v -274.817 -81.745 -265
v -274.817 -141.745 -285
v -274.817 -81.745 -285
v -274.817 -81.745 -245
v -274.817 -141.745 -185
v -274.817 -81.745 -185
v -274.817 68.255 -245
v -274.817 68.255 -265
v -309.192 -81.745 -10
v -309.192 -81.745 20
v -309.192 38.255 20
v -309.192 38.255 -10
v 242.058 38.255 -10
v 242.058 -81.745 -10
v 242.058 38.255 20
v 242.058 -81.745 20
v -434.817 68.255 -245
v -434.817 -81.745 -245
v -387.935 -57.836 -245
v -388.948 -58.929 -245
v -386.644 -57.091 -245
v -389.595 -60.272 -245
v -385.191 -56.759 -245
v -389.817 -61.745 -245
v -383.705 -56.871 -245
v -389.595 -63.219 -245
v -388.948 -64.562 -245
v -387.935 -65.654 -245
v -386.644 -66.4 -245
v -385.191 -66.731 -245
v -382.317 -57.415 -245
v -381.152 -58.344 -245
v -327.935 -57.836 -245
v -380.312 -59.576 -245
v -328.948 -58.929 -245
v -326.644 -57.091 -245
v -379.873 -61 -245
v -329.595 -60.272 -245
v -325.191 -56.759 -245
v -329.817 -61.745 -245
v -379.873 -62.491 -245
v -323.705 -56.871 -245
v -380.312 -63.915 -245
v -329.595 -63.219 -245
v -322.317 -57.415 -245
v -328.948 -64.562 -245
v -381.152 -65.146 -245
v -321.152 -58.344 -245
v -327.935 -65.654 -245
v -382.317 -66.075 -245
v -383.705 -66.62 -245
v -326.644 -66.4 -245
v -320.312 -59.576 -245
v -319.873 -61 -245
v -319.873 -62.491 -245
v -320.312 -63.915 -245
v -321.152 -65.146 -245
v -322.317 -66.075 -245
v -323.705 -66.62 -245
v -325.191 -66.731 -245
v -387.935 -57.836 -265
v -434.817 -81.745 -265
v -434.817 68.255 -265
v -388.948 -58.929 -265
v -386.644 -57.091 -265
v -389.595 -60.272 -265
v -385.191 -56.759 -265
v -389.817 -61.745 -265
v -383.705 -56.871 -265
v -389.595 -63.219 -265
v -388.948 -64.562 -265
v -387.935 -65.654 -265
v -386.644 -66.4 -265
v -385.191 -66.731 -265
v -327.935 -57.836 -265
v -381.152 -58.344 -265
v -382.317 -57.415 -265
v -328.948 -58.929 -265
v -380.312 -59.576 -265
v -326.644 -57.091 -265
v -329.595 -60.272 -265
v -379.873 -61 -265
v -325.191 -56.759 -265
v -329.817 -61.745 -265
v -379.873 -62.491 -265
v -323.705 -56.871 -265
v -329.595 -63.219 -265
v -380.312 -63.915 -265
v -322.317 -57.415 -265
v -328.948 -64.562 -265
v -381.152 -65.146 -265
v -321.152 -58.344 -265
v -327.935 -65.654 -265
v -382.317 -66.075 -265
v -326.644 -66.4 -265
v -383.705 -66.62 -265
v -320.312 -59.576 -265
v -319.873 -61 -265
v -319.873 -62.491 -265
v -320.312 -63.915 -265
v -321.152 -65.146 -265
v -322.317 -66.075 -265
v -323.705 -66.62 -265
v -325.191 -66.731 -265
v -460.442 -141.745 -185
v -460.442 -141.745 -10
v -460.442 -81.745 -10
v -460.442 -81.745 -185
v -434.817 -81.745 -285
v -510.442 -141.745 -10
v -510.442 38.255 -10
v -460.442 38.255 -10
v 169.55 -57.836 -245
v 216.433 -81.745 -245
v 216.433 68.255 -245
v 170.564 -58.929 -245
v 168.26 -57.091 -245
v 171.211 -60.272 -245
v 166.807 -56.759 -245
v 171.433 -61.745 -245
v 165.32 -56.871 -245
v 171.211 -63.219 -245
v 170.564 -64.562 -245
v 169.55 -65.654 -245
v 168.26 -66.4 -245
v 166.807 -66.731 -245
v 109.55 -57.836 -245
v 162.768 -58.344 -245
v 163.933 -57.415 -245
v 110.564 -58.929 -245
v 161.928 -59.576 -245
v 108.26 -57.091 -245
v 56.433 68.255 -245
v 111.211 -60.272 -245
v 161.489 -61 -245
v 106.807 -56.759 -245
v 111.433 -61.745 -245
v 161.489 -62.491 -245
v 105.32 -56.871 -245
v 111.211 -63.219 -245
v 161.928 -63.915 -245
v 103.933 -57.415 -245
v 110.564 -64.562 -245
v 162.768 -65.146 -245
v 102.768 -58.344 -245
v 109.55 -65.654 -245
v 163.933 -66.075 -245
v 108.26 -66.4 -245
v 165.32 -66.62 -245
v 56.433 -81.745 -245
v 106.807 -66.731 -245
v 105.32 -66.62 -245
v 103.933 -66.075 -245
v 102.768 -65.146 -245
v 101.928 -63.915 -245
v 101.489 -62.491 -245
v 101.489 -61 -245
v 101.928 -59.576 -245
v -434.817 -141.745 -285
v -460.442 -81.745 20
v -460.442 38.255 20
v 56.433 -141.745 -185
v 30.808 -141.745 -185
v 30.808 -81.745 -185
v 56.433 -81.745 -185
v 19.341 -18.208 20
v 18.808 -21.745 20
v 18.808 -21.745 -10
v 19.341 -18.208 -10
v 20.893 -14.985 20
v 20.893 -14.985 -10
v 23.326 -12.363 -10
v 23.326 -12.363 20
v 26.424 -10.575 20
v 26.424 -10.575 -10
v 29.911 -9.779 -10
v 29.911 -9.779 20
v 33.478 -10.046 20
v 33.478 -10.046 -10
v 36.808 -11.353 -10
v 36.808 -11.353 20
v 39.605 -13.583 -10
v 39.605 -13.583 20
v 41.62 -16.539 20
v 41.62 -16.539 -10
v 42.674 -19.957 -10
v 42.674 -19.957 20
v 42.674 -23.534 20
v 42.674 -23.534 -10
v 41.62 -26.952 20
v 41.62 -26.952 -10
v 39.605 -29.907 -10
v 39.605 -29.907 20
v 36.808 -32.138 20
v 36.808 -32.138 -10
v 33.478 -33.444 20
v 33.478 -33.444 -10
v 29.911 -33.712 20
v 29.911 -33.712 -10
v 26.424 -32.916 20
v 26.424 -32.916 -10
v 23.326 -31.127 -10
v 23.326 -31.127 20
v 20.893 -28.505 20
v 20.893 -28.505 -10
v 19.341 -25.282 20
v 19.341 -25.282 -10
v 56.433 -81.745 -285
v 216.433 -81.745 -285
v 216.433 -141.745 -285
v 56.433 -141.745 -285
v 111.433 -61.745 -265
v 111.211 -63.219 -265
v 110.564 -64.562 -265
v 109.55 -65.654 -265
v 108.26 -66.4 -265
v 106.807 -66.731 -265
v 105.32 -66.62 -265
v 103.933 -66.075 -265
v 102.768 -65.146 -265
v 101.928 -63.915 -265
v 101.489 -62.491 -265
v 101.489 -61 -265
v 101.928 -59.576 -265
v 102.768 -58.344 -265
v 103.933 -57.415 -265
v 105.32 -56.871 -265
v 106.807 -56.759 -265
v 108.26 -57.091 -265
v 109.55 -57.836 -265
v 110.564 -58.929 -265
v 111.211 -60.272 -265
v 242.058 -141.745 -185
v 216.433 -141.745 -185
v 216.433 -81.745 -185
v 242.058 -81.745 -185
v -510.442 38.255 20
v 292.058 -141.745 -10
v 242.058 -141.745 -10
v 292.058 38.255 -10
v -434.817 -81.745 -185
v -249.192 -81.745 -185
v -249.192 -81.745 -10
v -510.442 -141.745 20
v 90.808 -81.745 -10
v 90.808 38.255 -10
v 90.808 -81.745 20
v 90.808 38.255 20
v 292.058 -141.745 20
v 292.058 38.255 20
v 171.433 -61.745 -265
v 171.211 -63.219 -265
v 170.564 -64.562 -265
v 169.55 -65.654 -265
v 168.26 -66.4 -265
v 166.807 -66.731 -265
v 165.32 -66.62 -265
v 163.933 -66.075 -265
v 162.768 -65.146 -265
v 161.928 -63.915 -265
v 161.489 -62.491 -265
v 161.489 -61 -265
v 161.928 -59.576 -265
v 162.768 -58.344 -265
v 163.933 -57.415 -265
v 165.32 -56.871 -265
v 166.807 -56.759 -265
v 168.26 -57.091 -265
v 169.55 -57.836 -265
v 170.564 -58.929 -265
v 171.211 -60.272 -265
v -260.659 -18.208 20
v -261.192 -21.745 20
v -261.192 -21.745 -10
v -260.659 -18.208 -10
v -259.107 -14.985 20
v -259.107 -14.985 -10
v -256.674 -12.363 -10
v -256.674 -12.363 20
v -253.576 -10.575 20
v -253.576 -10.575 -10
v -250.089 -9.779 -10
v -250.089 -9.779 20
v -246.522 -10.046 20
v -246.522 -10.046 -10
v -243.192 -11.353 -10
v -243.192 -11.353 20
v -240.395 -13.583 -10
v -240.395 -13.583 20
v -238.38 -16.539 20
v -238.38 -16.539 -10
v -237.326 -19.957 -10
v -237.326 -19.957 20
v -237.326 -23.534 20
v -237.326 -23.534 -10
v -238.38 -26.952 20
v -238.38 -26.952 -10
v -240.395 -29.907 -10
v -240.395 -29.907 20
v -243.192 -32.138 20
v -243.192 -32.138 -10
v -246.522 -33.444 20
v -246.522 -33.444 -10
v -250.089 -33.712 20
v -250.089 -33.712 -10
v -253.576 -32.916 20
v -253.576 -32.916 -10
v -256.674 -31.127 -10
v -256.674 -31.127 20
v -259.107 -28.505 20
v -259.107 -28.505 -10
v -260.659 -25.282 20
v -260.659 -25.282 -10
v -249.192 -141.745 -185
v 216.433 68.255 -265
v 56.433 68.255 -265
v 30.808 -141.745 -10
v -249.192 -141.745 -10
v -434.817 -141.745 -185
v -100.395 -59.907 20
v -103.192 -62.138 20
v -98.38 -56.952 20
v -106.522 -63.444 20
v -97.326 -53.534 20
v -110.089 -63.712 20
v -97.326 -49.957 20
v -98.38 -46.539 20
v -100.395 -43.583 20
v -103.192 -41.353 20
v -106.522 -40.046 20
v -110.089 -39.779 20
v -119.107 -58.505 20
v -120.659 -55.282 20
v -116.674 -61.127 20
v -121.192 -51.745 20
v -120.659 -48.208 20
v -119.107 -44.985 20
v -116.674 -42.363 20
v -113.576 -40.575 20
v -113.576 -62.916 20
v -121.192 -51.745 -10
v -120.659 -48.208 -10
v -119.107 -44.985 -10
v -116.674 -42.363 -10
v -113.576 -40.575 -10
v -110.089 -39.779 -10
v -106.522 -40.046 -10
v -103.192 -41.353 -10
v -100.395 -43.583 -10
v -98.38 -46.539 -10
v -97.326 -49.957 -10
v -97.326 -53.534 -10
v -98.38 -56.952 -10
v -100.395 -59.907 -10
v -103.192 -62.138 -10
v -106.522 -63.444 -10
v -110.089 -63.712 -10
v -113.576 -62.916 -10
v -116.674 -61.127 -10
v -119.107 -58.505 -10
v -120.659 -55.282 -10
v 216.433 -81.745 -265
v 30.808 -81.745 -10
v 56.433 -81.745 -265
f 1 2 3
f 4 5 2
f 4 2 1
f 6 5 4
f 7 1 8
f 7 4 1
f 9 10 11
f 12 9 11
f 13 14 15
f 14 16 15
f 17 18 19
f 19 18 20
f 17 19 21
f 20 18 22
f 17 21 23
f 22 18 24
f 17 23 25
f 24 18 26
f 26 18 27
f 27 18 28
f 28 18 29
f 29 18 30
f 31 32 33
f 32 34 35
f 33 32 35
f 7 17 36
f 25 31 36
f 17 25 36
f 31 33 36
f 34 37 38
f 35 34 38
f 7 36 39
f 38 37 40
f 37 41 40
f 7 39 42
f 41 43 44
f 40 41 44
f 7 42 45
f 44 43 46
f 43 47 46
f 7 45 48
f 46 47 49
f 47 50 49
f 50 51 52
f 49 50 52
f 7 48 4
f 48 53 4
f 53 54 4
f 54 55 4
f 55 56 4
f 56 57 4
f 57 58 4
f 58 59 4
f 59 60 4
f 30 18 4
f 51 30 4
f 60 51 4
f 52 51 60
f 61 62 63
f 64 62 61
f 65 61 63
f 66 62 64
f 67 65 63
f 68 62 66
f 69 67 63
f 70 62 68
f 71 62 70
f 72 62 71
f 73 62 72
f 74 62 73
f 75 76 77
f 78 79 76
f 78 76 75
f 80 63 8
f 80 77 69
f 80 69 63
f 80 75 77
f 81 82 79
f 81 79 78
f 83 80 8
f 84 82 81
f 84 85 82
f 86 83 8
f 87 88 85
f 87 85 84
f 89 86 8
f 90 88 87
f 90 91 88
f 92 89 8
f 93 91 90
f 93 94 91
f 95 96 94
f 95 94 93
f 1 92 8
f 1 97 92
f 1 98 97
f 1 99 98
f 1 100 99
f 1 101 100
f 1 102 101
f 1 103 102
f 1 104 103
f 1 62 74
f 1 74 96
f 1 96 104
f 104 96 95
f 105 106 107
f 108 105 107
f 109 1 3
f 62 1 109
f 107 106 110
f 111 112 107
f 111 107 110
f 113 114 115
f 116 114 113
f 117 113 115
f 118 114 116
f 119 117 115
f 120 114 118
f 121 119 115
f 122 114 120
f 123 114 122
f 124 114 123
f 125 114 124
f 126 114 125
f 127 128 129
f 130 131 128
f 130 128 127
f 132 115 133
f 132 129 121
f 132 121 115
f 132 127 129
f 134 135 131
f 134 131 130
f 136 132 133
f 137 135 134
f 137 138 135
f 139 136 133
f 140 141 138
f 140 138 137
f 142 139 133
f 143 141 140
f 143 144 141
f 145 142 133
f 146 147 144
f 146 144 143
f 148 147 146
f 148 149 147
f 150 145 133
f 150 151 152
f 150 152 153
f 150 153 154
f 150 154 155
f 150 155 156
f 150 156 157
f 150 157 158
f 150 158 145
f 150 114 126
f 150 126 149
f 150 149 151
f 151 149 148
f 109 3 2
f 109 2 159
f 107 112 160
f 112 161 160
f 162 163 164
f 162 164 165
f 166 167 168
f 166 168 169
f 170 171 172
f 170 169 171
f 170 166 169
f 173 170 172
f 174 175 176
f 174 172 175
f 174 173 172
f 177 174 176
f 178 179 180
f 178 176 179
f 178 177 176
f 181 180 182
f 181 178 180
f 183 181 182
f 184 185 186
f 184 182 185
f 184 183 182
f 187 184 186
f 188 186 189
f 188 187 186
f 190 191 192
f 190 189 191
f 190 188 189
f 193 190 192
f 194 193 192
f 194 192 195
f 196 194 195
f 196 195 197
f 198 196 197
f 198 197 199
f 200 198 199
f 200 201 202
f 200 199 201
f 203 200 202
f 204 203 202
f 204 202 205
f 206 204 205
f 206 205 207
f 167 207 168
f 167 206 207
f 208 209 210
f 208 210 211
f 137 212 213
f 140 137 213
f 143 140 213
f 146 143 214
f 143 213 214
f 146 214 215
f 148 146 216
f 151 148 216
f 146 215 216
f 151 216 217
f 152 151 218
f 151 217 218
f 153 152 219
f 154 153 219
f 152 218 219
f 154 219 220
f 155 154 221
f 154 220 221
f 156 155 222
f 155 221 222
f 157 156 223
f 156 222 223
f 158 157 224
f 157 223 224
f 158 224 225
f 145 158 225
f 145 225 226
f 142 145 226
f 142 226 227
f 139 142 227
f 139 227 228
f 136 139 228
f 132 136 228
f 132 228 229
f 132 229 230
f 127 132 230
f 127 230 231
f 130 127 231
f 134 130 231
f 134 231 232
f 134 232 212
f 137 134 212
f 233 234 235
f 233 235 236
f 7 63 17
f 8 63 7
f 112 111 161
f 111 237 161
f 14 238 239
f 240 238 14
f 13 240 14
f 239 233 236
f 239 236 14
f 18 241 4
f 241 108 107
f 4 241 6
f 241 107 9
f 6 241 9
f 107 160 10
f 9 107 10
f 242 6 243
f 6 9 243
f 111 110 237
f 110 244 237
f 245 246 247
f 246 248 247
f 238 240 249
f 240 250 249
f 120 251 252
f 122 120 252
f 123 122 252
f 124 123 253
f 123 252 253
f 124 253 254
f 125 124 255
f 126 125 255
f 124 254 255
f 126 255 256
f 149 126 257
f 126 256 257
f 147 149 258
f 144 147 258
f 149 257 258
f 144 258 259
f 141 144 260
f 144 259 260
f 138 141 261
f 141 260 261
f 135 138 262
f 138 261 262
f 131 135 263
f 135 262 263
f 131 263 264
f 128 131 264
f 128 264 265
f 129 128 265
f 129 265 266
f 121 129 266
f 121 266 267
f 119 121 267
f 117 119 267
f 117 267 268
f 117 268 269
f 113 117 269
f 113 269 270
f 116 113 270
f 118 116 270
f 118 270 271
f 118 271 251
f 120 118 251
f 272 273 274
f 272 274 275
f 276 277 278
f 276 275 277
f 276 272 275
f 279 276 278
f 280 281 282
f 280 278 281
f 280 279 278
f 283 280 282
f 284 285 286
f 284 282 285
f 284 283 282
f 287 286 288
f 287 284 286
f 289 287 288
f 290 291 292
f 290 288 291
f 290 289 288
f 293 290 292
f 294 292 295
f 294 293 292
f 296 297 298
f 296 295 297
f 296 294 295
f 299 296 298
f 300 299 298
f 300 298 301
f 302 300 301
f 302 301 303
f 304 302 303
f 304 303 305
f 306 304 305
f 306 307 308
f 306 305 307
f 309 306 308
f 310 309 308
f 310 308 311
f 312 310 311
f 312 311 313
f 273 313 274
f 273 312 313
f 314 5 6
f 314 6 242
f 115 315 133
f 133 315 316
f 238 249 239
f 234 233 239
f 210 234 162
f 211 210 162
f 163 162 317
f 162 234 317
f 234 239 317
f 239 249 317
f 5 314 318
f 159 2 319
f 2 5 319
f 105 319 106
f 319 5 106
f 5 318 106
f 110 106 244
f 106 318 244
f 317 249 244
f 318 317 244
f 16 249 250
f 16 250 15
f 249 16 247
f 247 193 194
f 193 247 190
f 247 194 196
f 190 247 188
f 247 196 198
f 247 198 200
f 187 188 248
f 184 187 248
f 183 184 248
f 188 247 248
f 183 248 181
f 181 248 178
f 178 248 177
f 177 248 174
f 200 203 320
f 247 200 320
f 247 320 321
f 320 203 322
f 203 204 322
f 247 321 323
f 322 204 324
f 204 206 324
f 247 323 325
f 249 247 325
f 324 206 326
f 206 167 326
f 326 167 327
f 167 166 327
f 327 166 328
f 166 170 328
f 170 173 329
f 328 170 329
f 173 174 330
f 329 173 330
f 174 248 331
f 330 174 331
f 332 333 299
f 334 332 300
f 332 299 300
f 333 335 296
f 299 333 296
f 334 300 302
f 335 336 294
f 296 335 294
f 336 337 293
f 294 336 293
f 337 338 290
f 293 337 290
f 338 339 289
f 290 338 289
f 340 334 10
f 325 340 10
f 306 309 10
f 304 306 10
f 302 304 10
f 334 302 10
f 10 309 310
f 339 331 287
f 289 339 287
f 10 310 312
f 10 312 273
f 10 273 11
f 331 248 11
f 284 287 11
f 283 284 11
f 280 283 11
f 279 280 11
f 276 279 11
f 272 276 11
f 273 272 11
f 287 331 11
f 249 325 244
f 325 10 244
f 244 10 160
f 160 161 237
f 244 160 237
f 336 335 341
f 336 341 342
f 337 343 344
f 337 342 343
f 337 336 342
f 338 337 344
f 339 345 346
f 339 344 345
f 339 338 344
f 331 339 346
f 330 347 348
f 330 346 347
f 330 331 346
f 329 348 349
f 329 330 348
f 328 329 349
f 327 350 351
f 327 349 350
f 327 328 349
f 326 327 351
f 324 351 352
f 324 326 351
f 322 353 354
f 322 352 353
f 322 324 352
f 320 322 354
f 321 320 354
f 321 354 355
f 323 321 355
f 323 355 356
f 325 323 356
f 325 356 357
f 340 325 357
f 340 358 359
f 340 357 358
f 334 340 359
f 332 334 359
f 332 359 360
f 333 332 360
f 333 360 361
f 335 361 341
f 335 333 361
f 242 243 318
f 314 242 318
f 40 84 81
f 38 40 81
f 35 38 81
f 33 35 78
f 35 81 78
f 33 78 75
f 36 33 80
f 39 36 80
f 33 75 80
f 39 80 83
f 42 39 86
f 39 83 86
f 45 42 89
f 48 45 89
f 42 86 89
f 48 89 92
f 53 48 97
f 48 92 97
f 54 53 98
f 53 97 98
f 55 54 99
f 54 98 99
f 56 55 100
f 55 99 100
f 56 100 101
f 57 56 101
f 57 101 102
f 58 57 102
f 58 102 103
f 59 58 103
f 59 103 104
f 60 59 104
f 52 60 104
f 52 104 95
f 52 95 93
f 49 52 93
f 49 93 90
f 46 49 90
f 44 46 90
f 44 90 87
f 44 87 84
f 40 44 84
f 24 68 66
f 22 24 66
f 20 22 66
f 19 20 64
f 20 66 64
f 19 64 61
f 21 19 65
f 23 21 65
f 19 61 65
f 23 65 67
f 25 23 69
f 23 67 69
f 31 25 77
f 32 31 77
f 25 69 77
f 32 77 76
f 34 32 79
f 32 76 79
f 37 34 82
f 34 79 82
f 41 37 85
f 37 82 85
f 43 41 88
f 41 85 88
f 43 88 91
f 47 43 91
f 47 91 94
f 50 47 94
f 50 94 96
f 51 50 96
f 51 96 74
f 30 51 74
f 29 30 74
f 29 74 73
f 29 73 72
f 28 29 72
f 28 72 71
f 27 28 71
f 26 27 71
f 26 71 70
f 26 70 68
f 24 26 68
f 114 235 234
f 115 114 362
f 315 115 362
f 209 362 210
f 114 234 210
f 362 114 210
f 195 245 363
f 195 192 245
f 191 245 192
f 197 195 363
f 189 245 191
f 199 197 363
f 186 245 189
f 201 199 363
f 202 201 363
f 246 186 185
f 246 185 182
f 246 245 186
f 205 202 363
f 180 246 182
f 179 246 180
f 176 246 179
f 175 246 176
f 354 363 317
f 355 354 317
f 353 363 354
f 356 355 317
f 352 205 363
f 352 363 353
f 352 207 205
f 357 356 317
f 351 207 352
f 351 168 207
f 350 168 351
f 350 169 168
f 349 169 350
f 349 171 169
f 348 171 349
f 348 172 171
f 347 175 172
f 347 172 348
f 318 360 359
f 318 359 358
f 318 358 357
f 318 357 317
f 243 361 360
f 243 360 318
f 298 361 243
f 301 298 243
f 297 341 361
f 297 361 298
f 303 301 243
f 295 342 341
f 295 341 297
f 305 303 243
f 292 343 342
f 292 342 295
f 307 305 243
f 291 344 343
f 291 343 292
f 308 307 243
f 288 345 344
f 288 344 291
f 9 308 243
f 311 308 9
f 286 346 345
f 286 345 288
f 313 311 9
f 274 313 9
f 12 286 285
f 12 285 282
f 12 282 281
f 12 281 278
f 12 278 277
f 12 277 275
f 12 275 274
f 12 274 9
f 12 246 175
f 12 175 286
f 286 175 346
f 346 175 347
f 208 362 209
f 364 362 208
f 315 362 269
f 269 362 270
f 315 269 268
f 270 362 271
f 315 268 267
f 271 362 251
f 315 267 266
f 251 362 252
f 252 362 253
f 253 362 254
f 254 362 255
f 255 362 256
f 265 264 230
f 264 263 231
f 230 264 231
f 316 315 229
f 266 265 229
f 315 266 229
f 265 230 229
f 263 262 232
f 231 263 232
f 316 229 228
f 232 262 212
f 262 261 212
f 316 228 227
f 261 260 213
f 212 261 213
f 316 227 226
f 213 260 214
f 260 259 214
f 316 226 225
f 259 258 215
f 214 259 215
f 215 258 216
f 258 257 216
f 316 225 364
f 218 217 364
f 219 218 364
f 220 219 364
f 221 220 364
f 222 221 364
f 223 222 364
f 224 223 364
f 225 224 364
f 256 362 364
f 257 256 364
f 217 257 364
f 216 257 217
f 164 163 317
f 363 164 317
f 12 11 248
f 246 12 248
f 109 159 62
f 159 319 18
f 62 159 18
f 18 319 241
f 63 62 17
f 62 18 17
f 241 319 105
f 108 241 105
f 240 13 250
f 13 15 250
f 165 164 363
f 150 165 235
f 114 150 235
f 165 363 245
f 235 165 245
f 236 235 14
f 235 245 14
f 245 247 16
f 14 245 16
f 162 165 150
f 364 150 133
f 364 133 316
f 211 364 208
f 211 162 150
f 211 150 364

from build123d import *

# Parameters (mm, degrees)
SKETCH_1_W               = 159.79179057
SKETCH_1_H               = 74.251758256
EXTRUDE_1_DEPTH          = 20
EXTRUDE_2_DEPTH          = 20
EXTRUDE_3_DEPTH          = 10
CUT_EXTRUDE_1_DEPTH      = 531.606136663
CUT_EXTRUDE_1_DEPTH_BACK = 531.606136663
SKETCH_3_R               = 12
EXTRUDE_4_DEPTH          = 350
SKETCH_5_W               = 211.25
SKETCH_5_H               = 65
EXTRUDE_5_DEPTH          = 60
CUT_EXTRUDE_2_DEPTH      = 876.769934526
CUT_EXTRUDE_2_DEPTH_BACK = 876.769934526
SKETCH_6_W               = 160
SKETCH_6_H               = 30
SKETCH_7_R               = 25
EXTRUDE_6_DEPTH          = 185
CUT_EXTRUDE_3_DEPTH      = 676.870656298
CUT_EXTRUDE_3_DEPTH_BACK = 676.870656298
SKETCH_8_W               = 25.625
SKETCH_8_H               = 240
SKETCH_11_R              = 40
EXTRUDE_8_DEPTH          = 93.091049
EXTRUDE_9_DEPTH          = 30
EXTRUDE_10_DEPTH         = 93.091048505
EXTRUDE_11_DEPTH         = 155
SKETCH_13_W              = 644.241004896
SKETCH_13_H              = 193.771713101
CUT_EXTRUDE_5_DEPTH      = 229
CHAMFER_6_SIZE           = 40
SKETCH_15_W              = 224.735234266
SKETCH_15_H              = 137.83761035
SKETCH_15_W_2            = 260.692871749
SKETCH_15_H_2            = 187.77877352
CUT_EXTRUDE_8_DEPTH      = 406
SKETCH_16_W              = 1192.594976507
SKETCH_16_H              = 256.002705907
CUT_EXTRUDE_9_DEPTH      = 406
SKETCH_18_W              = 160
SKETCH_18_H              = 20
EXTRUDE_12_DEPTH         = 150
SKETCH_19_W              = 160
SKETCH_19_H              = 60
EXTRUDE_13_DEPTH         = 20
SKETCH_20_R              = 5
CUT_EXTRUDE_10_DEPTH     = 65


with BuildPart() as part:
    # 草图1 → 凸台-拉伸1 (new body)
    with BuildSketch(Plane.XY):
        with Locations((10.911998257, 1.128827406)):
            Rectangle(SKETCH_1_W, SKETCH_1_H)
    extrude(amount=EXTRUDE_1_DEPTH)

    # 草图2 → 凸台-拉伸2 (add)
    with BuildSketch(Plane(origin=(0, 0, 0), x_dir=(-1, 0, 0), z_dir=(0, 0, -1))):
        Polygon((309.192106458, 38.254706534), (-90.807893542, 38.254706534), (-90.807893542, -81.745293466), (-242.057893542, -81.745293466), (-242.057893542, 38.254706534), (-292.057893542, 38.254706534), (-292.057893542, -141.745293466), (510.442106458, -141.745293466), (510.442106458, 38.254706534), (460.442106458, 38.254706534), (460.442106458, -81.745293466), (309.192106458, -81.745293466), align=None)
    extrude(amount=-EXTRUDE_2_DEPTH)

    # 草图2<2> → 凸台-拉伸3 (add)
    with BuildSketch(Plane(origin=(0, 0, 0), x_dir=(-1, 0, 0), z_dir=(0, 0, -1))):
        Polygon((309.192106458, 38.254706534), (-90.807893542, 38.254706534), (-90.807893542, -81.745293466), (-242.057893542, -81.745293466), (-242.057893542, 38.254706534), (-292.057893542, 38.254706534), (-292.057893542, -141.745293466), (510.442106458, -141.745293466), (510.442106458, 38.254706534), (460.442106458, 38.254706534), (460.442106458, -81.745293466), (309.192106458, -81.745293466), align=None)
    extrude(amount=EXTRUDE_3_DEPTH)

    # 草图3 → 切除-拉伸1 (cut, two sides: drawn at the far end of the back side and taken through both)
    with BuildSketch(Plane(origin=(0, 0, -10), x_dir=(-1, 0, 0), z_dir=(0, 0, -1)).offset(-CUT_EXTRUDE_1_DEPTH_BACK)):
        with Locations((-30.807893542, -21.745293466)):
            Circle(SKETCH_3_R)
        with Locations((109.192106458, -51.745293466)):
            Circle(SKETCH_3_R)
        with Locations((249.192106458, -21.745293466)):
            Circle(SKETCH_3_R)
    extrude(amount=CUT_EXTRUDE_1_DEPTH + CUT_EXTRUDE_1_DEPTH_BACK, mode=Mode.SUBTRACT)

    # 草图4 → 凸台-拉伸4 (add)
    with BuildSketch(Plane(origin=(0, 0, -10), x_dir=(-1, 0, 0), z_dir=(0, 0, -1))):
        Polygon((460.442106458, -81.745293466), (309.192106458, -81.745293466), (249.192106458, -81.745293466), (249.192106458, -141.745293466), (309.192106458, -141.745293466), (460.442106458, -141.745293466), align=None)
        Polygon((-242.057893542, -81.745293466), (-90.807893542, -81.745293466), (-30.807893542, -81.745293466), (-30.807893542, -141.745293466), (-90.807893542, -141.745293466), (-242.057893542, -141.745293466), align=None)
    extrude(amount=EXTRUDE_4_DEPTH)

    # 草图5 → 凸台-拉伸5 (add)
    with BuildSketch(Plane.XZ.offset(141.745293466)):
        with Locations((136.432893542, -392.5)):
            Rectangle(SKETCH_5_W, SKETCH_5_H)
        with Locations((-354.817106458, -392.5)):
            Rectangle(SKETCH_5_W, SKETCH_5_H)
    extrude(amount=-EXTRUDE_5_DEPTH)

    # 草图6 → 切除-拉伸2 (cut, two sides: drawn at the far end of the back side and taken through both)
    with BuildSketch(Plane(origin=(242.057893542, 0, 0), x_dir=(0, 0, -1), z_dir=(1, 0, 0)).offset(-CUT_EXTRUDE_2_DEPTH_BACK)):
        with Locations((345, -96.745293466)):
            Rectangle(SKETCH_6_W, SKETCH_6_H)
    extrude(amount=CUT_EXTRUDE_2_DEPTH + CUT_EXTRUDE_2_DEPTH_BACK, mode=Mode.SUBTRACT)

    # 草图7 → 凸台-拉伸6 (add)
    with BuildSketch(Plane.XZ.offset(141.745293466)):
        with Locations((-354.817106458, -345)):
            Circle(SKETCH_7_R)
        with Locations((136.432893542, -345)):
            Circle(SKETCH_7_R)
    extrude(amount=-EXTRUDE_6_DEPTH)

    # 草图8 → 切除-拉伸3 (cut, two sides: drawn at the far end of the back side and taken through both)
    with BuildSketch(Plane(origin=(0, -81.745293466, 0), x_dir=(1, 0, 0), z_dir=(0, 1, 0)).offset(-CUT_EXTRUDE_3_DEPTH_BACK)):
        with Locations((43.620393542, 305)):
            Rectangle(SKETCH_8_W, SKETCH_8_H)
        Polygon((-434.817106458, 425), (-434.817106458, 265), (-434.817106458, 185), (-460.442106458, 185), (-460.442106458, 516.096231242), (-434.817106458, 516.096231242), align=None)
        Polygon((-274.817106458, 425), (-274.817106458, 265), (-274.817106458, 185), (-219.643944132, 185), (-219.643944132, 516.096231242), (-274.817106458, 516.096231242), align=None)
        with Locations((229.245393542, 305)):
            Rectangle(SKETCH_8_W, SKETCH_8_H)
    extrude(amount=CUT_EXTRUDE_3_DEPTH + CUT_EXTRUDE_3_DEPTH_BACK, mode=Mode.SUBTRACT)

    # 草图11 → 凸台-拉伸8 (add)
    with BuildSketch(Plane(origin=(0, -111.745293466, 0), x_dir=(1, 0, 0), z_dir=(0, 1, 0))):
        with Locations(Location((-354.817106458, 345, 0), (0, 0, 90))):
            Circle(SKETCH_11_R)
        with Locations(Location((136.432893542, 345, 0), (0, 0, 90))):
            Circle(SKETCH_11_R)
    extrude(amount=EXTRUDE_8_DEPTH)

    # 草图12 → 凸台-拉伸9 (add)
    with BuildSketch(Plane(origin=(0, -111.745293466, 0), x_dir=(1, 0, 0), z_dir=(0, 1, 0))):
        with BuildLine():
            ThreePointArc((-569.817106458, 345), (-529.817106458, 385), (-489.817106458, 345))
            Line((-489.817106458, 345), (-434.817106458, 345))
            Line((-434.817106458, 345), (-434.817106458, 425))
            Line((-434.817106458, 425), (-569.817106458, 425))
            Line((-569.817106458, 425), (-609.817106458, 385))
            Line((-609.817106458, 385), (-609.817106458, 345))
            Line((-609.817106458, 345), (-569.817106458, 345))
        make_face()
        with BuildLine():
            ThreePointArc((-569.817106458, 345), (-529.817106458, 305), (-489.817106458, 345))
            Line((-489.817106458, 345), (-504.817106458, 345))
            ThreePointArc((-504.817106458, 345), (-529.817106458, 320), (-554.817106458, 345))
            Line((-554.817106458, 345), (-569.817106458, 345))
        make_face()
        with BuildLine():
            Line((-504.817106458, 345), (-489.817106458, 345))
            ThreePointArc((-489.817106458, 345), (-529.817106458, 385), (-569.817106458, 345))
            Line((-569.817106458, 345), (-554.817106458, 345))
            ThreePointArc((-554.817106458, 345), (-529.817106458, 370), (-504.817106458, 345))
        make_face()
        with BuildLine():
            ThreePointArc((-554.817106458, 345), (-529.817106458, 320), (-504.817106458, 345))
            Line((-504.817106458, 345), (-554.817106458, 345))
        make_face()
        with BuildLine():
            Line((-554.817106458, 345), (-504.817106458, 345))
            ThreePointArc((-504.817106458, 345), (-529.817106458, 370), (-554.817106458, 345))
        make_face()
        with BuildLine():
            Line((-434.817106458, 345), (-489.817106458, 345))
            ThreePointArc((-489.817106458, 345), (-529.817106458, 305), (-569.817106458, 345))
            Line((-569.817106458, 345), (-609.817106458, 345))
            Line((-609.817106458, 345), (-609.817106458, 305))
            Line((-609.817106458, 305), (-569.817106458, 265))
            Line((-569.817106458, 265), (-434.817106458, 265))
            Line((-434.817106458, 265), (-434.817106458, 345))
        make_face()
    extrude_9 = extrude(amount=-EXTRUDE_9_DEPTH)

    # 草图12<3> → 凸台-拉伸10 (add)
    with BuildSketch(Plane(origin=(0, -111.745293466, 0), x_dir=(1, 0, 0), z_dir=(0, 1, 0))):
        with BuildLine():
            ThreePointArc((-569.817106458, 345), (-529.817106458, 305), (-489.817106458, 345))
            Line((-489.817106458, 345), (-504.817106458, 345))
            ThreePointArc((-504.817106458, 345), (-529.817106458, 320), (-554.817106458, 345))
            Line((-554.817106458, 345), (-569.817106458, 345))
        make_face()
        with BuildLine():
            Line((-504.817106458, 345), (-489.817106458, 345))
            ThreePointArc((-489.817106458, 345), (-529.817106458, 385), (-569.817106458, 345))
            Line((-569.817106458, 345), (-554.817106458, 345))
            ThreePointArc((-554.817106458, 345), (-529.817106458, 370), (-504.817106458, 345))
        make_face()
        with BuildLine():
            ThreePointArc((-554.817106458, 345), (-529.817106458, 320), (-504.817106458, 345))
            Line((-504.817106458, 345), (-554.817106458, 345))
        make_face()
        with BuildLine():
            Line((-554.817106458, 345), (-504.817106458, 345))
            ThreePointArc((-504.817106458, 345), (-529.817106458, 370), (-554.817106458, 345))
        make_face()
    extrude_10 = extrude(amount=EXTRUDE_10_DEPTH)

    # 草图12<4> → 凸台-拉伸11 (add)
    with BuildSketch(Plane(origin=(0, -111.745293466, 0), x_dir=(1, 0, 0), z_dir=(0, 1, 0))):
        with BuildLine():
            ThreePointArc((-554.817106458, 345), (-529.817106458, 320), (-504.817106458, 345))
            Line((-504.817106458, 345), (-554.817106458, 345))
        make_face()
        with BuildLine():
            Line((-554.817106458, 345), (-504.817106458, 345))
            ThreePointArc((-504.817106458, 345), (-529.817106458, 370), (-554.817106458, 345))
        make_face()
    extrude_11 = extrude(amount=EXTRUDE_11_DEPTH)

    # 镜向1: 凸台-拉伸9, 凸台-拉伸10, 凸台-拉伸11 across plane
    add(extrude_9.mirror(Plane(origin=(-109.192106458, 0, 0), x_dir=(0, 0, 1), z_dir=(1, 0, 0))))
    add(extrude_10.mirror(Plane(origin=(-109.192106458, 0, 0), x_dir=(0, 0, 1), z_dir=(1, 0, 0))))
    add(extrude_11.mirror(Plane(origin=(-109.192106458, 0, 0), x_dir=(0, 0, 1), z_dir=(1, 0, 0))))

    # 草图13 → 切除-拉伸5 (cut)
    with BuildSketch(Plane(origin=(0, -111.745293466, 0), x_dir=(1, 0, 0), z_dir=(0, 1, 0))):
        with Locations((-118.68092746, 369.802896621)):
            Rectangle(SKETCH_13_W, SKETCH_13_H)
    extrude(amount=CUT_EXTRUDE_5_DEPTH, mode=Mode.SUBTRACT)

    # 倒角6
    chamfer_6_edges = [part.edges().sort_by_distance(p)[0] for p in [
        (-274.817106458, -126.745293466, -425),
        (56.432893542, -126.745293466, -425),
    ]]
    chamfer(chamfer_6_edges, length=CHAMFER_6_SIZE)

    # 草图15 → 切除-拉伸8 (cut)
    with BuildSketch(Plane(origin=(0, -111.745293466, 0), x_dir=(1, 0, 0), z_dir=(0, 1, 0))):
        with Locations((-507.223176925, 357.81701746)):
            Rectangle(SKETCH_15_W, SKETCH_15_H)
        with Locations((316.806015386, 361.812310513)):
            Rectangle(SKETCH_15_W_2, SKETCH_15_H_2)
    extrude(amount=CUT_EXTRUDE_8_DEPTH, mode=Mode.SUBTRACT)

    # 草图16 → 切除-拉伸9 (cut)
    with BuildSketch(Plane(origin=(0, -111.745293466, 0), x_dir=(1, 0, 0), z_dir=(0, 1, 0))):
        with Locations((-128.169748462, 393.001352954)):
            Rectangle(SKETCH_16_W, SKETCH_16_H)
    extrude(amount=-CUT_EXTRUDE_9_DEPTH, mode=Mode.SUBTRACT)

    # 草图18 → 凸台-拉伸12 (add)
    with BuildSketch(Plane(origin=(0, -81.745293466, 0), x_dir=(1, 0, 0), z_dir=(0, 1, 0))):
        with Locations((-354.817106458, 255)):
            Rectangle(SKETCH_18_W, SKETCH_18_H)
    extrude_12 = extrude(amount=EXTRUDE_12_DEPTH)

    # 镜向2: 凸台-拉伸12 across plane
    add(extrude_12.mirror(Plane(origin=(-109.192106458, 0, 0), x_dir=(0, 0, 1), z_dir=(1, 0, 0))))

    # 草图19 → 凸台-拉伸13 (add)
    with BuildSketch(Plane(origin=(0, 0, -265), x_dir=(-1, 0, 0), z_dir=(0, 0, -1))):
        with Locations((354.817106458, -111.745293466)):
            Rectangle(SKETCH_19_W, SKETCH_19_H)
        with Locations((-136.432893542, -111.745293466)):
            Rectangle(SKETCH_19_W, SKETCH_19_H)
    extrude(amount=EXTRUDE_13_DEPTH)

    # 草图20 → 切除-拉伸10 (cut)
    with BuildSketch(Plane(origin=(0, 0, -285), x_dir=(-1, 0, 0), z_dir=(0, 0, -1))):
        with Locations((384.817106458, -61.745293466)):
            Circle(SKETCH_20_R)
        with Locations((324.817106458, -61.745293466)):
            Circle(SKETCH_20_R)
        with Locations(Location((-106.432893542, -61.745293466, 0), (0, 0, 180))):
            Circle(SKETCH_20_R)
        with Locations(Location((-166.432893542, -61.745293466, 0), (0, 0, 180))):
            Circle(SKETCH_20_R)
    extrude(amount=-CUT_EXTRUDE_10_DEPTH, mode=Mode.SUBTRACT)


solid = part.part
